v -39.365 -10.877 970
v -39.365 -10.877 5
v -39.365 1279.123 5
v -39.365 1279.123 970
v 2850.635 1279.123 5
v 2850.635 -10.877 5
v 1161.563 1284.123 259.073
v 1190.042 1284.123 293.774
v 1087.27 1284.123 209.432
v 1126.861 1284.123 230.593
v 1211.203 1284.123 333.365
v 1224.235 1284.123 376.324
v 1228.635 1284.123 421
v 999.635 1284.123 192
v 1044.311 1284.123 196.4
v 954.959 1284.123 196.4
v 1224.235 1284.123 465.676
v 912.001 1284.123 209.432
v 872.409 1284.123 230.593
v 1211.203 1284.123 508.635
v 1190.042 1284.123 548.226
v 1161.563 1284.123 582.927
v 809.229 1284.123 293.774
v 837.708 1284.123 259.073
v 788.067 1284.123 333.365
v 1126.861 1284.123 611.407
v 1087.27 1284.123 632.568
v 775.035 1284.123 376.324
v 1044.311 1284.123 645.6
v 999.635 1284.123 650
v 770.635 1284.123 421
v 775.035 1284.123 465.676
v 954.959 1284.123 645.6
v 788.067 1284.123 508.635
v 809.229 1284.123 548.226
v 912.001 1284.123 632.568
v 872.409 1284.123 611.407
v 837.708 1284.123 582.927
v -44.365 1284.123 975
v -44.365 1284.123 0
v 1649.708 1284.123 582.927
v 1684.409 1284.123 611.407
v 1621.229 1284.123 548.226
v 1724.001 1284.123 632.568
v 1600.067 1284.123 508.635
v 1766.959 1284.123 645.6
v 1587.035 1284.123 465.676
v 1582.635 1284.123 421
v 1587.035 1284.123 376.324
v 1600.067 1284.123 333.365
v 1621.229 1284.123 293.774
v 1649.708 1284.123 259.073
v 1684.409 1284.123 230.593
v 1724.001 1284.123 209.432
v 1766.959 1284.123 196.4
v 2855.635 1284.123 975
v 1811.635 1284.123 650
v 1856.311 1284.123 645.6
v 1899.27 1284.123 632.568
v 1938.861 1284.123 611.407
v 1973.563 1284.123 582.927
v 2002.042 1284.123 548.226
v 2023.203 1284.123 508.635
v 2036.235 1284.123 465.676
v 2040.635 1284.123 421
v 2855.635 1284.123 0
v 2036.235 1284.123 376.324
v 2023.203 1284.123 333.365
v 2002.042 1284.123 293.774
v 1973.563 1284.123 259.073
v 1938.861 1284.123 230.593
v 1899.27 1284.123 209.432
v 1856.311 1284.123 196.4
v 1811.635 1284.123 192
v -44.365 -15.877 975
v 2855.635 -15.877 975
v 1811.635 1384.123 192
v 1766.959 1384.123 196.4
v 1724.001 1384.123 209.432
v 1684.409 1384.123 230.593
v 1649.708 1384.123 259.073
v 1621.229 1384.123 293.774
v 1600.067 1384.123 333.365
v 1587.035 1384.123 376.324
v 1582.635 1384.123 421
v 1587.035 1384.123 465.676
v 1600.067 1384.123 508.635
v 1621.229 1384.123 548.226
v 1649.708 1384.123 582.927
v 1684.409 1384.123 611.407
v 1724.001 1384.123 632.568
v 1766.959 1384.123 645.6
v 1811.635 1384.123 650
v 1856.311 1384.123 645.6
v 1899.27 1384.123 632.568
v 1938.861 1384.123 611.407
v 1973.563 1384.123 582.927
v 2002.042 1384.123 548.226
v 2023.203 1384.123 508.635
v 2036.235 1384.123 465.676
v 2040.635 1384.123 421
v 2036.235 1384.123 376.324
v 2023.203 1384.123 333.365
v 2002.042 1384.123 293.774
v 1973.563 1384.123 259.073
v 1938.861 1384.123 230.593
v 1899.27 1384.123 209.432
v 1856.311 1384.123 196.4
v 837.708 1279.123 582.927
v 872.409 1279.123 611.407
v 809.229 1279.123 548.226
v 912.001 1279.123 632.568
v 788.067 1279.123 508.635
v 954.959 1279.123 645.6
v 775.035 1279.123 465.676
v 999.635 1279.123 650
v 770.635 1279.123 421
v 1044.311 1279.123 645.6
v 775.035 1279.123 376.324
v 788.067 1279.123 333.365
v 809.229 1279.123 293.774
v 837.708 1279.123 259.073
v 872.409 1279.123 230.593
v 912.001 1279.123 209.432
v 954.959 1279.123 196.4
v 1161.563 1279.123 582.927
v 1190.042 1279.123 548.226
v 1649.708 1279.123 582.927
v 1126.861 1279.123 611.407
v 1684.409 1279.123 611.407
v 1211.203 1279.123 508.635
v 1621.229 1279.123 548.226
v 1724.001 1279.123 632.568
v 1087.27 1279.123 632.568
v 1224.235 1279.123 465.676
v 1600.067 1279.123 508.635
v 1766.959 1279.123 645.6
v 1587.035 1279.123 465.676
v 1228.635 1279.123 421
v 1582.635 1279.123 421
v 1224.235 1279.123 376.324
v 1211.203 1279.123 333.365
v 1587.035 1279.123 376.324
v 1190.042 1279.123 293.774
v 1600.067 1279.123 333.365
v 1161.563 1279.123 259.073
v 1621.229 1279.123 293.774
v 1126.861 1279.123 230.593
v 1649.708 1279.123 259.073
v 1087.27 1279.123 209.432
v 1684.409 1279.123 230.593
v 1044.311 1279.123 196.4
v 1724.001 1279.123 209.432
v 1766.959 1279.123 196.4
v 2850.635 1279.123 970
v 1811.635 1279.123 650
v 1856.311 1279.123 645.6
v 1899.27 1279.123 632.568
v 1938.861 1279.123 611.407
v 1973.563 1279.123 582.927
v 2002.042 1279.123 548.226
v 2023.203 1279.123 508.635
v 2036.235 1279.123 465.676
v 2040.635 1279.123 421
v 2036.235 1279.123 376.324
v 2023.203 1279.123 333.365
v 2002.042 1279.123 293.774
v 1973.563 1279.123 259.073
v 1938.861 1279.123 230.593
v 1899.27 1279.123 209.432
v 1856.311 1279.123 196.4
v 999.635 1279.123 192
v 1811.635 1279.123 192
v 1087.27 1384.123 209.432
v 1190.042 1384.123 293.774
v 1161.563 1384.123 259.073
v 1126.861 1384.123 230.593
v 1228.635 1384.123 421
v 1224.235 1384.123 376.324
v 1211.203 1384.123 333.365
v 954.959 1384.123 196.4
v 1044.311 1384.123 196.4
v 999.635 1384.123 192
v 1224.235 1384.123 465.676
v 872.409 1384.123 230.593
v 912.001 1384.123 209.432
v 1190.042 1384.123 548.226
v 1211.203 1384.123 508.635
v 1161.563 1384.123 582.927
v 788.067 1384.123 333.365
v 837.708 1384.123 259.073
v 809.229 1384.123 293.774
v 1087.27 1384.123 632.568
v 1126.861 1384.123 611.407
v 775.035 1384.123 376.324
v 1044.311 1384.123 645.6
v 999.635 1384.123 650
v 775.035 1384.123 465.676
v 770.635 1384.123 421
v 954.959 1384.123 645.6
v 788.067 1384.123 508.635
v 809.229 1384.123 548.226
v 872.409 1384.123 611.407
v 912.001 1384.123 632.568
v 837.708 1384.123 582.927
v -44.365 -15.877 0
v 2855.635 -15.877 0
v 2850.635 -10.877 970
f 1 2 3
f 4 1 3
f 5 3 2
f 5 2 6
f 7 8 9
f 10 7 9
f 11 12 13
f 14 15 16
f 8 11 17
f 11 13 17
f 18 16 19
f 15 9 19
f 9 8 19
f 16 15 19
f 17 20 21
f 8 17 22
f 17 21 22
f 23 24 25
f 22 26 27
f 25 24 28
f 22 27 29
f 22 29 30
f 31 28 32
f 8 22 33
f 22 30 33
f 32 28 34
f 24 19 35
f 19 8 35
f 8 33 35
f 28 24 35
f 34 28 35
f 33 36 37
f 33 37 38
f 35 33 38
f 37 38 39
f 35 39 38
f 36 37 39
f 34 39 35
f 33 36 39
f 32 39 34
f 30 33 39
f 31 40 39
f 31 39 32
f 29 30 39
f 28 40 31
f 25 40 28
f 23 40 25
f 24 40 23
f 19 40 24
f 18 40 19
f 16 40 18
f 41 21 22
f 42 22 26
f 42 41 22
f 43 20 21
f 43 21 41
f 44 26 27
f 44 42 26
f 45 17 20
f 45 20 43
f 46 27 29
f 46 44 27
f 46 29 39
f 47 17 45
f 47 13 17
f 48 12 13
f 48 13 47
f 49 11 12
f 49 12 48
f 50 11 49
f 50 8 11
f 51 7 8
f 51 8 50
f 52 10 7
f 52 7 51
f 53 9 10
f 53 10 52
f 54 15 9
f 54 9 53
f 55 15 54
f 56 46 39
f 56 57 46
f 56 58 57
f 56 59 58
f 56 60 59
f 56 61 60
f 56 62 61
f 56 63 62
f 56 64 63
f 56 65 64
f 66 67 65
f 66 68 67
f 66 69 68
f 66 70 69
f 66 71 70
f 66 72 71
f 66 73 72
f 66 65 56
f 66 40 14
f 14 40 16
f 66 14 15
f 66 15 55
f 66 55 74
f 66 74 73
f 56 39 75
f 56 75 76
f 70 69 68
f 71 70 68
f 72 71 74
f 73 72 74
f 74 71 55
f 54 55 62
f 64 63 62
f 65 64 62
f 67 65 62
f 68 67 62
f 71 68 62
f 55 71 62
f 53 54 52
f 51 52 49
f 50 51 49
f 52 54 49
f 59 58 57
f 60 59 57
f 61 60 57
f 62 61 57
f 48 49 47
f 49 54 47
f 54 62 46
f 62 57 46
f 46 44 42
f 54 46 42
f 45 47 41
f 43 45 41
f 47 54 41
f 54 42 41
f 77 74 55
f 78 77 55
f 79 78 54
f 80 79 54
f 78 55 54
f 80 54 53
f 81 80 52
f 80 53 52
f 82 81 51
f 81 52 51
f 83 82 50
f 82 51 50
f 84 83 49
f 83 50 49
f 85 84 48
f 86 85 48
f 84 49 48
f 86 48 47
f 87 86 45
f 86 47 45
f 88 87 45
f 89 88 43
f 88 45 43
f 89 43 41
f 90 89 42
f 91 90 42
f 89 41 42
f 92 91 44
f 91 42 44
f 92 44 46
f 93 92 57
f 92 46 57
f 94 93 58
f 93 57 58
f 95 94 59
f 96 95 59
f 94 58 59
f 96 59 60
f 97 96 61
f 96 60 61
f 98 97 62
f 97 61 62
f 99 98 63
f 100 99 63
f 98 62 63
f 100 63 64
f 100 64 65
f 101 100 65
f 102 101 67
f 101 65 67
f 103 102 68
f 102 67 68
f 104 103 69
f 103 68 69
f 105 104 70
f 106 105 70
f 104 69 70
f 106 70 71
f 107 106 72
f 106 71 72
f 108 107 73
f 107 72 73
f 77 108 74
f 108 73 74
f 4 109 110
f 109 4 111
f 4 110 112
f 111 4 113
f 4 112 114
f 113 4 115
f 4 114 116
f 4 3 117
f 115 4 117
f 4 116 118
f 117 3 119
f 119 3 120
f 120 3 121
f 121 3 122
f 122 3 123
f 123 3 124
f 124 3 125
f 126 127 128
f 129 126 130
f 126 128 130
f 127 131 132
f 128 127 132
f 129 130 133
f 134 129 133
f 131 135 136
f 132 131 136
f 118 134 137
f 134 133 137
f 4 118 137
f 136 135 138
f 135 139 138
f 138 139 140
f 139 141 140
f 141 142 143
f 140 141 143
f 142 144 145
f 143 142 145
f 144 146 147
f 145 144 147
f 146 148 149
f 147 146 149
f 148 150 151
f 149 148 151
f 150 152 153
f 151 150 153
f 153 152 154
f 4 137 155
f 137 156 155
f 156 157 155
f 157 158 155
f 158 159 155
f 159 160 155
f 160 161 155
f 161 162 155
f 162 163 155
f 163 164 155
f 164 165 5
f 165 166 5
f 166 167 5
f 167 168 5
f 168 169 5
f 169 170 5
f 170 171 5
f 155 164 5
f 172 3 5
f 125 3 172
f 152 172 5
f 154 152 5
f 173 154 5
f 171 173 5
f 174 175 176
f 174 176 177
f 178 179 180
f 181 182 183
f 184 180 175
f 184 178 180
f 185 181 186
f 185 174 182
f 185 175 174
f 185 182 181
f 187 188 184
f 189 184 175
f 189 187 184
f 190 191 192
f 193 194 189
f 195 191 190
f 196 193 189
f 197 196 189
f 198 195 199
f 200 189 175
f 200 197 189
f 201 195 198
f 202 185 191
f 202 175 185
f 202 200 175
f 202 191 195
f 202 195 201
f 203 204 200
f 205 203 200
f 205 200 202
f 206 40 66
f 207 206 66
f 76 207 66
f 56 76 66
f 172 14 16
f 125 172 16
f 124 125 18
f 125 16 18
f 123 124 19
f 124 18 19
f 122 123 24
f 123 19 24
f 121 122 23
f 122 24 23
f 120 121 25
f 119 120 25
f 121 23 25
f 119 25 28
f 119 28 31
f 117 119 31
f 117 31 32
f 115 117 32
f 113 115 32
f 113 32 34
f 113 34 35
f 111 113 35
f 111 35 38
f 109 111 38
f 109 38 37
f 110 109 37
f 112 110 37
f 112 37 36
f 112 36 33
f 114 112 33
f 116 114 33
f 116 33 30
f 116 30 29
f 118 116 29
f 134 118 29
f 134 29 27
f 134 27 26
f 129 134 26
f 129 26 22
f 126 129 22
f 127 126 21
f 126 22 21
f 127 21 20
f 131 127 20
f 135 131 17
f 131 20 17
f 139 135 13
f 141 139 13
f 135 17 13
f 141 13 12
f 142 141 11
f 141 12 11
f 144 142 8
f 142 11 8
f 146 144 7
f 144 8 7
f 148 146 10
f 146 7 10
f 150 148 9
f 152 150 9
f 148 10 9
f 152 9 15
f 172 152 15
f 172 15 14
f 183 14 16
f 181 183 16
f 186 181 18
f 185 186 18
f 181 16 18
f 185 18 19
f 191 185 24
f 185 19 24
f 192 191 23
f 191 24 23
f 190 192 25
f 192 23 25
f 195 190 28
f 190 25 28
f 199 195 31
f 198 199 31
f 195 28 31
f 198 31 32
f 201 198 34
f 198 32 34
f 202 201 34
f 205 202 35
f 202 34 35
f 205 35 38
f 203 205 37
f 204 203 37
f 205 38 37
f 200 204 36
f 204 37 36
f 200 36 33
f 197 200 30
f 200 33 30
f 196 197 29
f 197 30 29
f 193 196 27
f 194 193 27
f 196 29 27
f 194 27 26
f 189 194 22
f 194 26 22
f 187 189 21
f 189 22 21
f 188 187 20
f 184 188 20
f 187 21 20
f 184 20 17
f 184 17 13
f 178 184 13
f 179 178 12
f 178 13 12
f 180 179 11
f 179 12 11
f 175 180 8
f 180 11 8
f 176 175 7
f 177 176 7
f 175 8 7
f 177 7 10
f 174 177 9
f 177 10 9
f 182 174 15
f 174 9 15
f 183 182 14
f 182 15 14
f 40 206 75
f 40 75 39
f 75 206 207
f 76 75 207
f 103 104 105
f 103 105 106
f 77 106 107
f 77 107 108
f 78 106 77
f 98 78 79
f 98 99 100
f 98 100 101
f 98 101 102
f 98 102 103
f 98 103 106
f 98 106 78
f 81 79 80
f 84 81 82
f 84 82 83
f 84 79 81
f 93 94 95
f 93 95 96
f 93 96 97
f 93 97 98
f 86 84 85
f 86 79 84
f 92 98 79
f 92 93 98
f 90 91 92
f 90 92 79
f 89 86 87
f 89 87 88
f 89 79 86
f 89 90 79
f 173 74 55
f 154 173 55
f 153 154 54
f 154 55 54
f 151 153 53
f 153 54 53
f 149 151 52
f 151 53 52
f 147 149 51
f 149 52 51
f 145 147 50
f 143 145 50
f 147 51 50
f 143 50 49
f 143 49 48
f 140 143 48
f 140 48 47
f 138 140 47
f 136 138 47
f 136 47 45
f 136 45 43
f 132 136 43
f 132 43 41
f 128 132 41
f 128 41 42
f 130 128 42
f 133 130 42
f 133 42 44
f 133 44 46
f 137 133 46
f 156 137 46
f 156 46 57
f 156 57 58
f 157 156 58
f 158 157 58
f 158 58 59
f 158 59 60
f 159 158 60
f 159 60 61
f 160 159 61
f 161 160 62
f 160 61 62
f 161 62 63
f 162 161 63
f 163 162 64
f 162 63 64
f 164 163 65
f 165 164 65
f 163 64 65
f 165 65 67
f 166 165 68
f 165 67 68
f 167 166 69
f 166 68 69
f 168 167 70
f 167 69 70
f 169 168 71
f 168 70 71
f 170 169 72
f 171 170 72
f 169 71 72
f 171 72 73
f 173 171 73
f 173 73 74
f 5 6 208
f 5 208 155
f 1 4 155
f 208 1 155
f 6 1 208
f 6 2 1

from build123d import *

# Parameters (mm, degrees)
F0_W     = 2900
F0_H     = 1300
F1_DEPTH = 975
F2_T     = -5
F4_DEPTH = 100
F5_DEPTH = 326


with BuildPart() as f1:
    # F0 (on Top) → F1 (new body)
    with BuildSketch(Plane.XY):
        with Locations((1405.6350782514, 634.1229822487)):
            Rectangle(F0_W, F0_H)
    extrude(amount=F1_DEPTH)

    # F2 (hollow: no face is removed)
    offset(amount=F2_T, mode=Mode.SUBTRACT)

    # F3 (on face) → F5 (cut)
    with BuildSketch(Plane(origin=(0, 1284.1229822487, 0), x_dir=(-1, 0, 0), z_dir=(0, 1, 0))):
        with BuildLine():
            ThreePointArc((-1811.6350782514, 650), (-1973.5625311431, 582.9274528917), (-2040.6350782514, 421))
            Line((-2040.6350782514, 421), (-1811.6350782514, 421))
            Line((-1811.6350782514, 421), (-1811.6350782514, 650))
        make_face()
        with BuildLine():
            ThreePointArc((-999.6350782514, 650), (-1161.5625311431, 582.9274528917), (-1228.6350782514, 421))
            Line((-1228.6350782514, 421), (-999.6350782514, 421))
            Line((-999.6350782514, 421), (-999.6350782514, 650))
        make_face()
        with BuildLine():
            Line((-999.6350782514, 421), (-1228.6350782514, 421))
            ThreePointArc((-1228.6350782514, 421), (-1161.5625311431, 259.0725471083), (-999.6350782514, 192))
            Line((-999.6350782514, 192), (-999.6350782514, 421))
        make_face()
        with BuildLine():
            Line((-1811.6350782514, 421), (-2040.6350782514, 421))
            ThreePointArc((-2040.6350782514, 421), (-1973.5625311431, 259.0725471083), (-1811.6350782514, 192))
            Line((-1811.6350782514, 192), (-1811.6350782514, 421))
        make_face()
        with BuildLine():
            Line((-1811.6350782514, 650), (-1811.6350782514, 421))
            Line((-1811.6350782514, 421), (-1582.6350782514, 421))
            ThreePointArc((-1582.6350782514, 421), (-1649.7076253596, 582.9274528917), (-1811.6350782514, 650))
        make_face()
        with BuildLine():
            Line((-1582.6350782514, 421), (-1811.6350782514, 421))
            Line((-1811.6350782514, 421), (-1811.6350782514, 192))
            ThreePointArc((-1811.6350782514, 192), (-1649.7076253596, 259.0725471083), (-1582.6350782514, 421))
        make_face()
        with BuildLine():
            Line((-999.6350782514, 650), (-999.6350782514, 421))
            Line((-999.6350782514, 421), (-770.6350782514, 421))
            ThreePointArc((-770.6350782514, 421), (-837.7076253596, 582.9274528917), (-999.6350782514, 650))
        make_face()
        with BuildLine():
            Line((-770.6350782514, 421), (-999.6350782514, 421))
            Line((-999.6350782514, 421), (-999.6350782514, 192))
            ThreePointArc((-999.6350782514, 192), (-837.7076253596, 259.0725471083), (-770.6350782514, 421))
        make_face()
    extrude(amount=-F5_DEPTH, mode=Mode.SUBTRACT)


with BuildPart() as f4:
    # F3 (on face) → F4 (new body)
    with BuildSketch(Plane(origin=(0, 1284.1229822487, 0), x_dir=(-1, 0, 0), z_dir=(0, 1, 0))):
        with BuildLine():
            Line((-1811.6350782514, 192), (-1811.6350782514, 421))
            Line((-1811.6350782514, 421), (-2040.6350782514, 421))
            ThreePointArc((-2040.6350782514, 421), (-1973.5625311431, 259.0725471083), (-1811.6350782514, 192))
        make_face()
        with BuildLine():
            Line((-2040.6350782514, 421), (-1811.6350782514, 421))
            Line((-1811.6350782514, 421), (-1811.6350782514, 650))
            ThreePointArc((-1811.6350782514, 650), (-1973.5625311431, 582.9274528917), (-2040.6350782514, 421))
        make_face()
        with BuildLine():
            Line((-1811.6350782514, 421), (-1582.6350782514, 421))
            ThreePointArc((-1582.6350782514, 421), (-1649.7076253596, 582.9274528917), (-1811.6350782514, 650))
            Line((-1811.6350782514, 650), (-1811.6350782514, 421))
        make_face()
        with BuildLine():
            ThreePointArc((-1811.6350782514, 192), (-1649.7076253596, 259.0725471083), (-1582.6350782514, 421))
            Line((-1582.6350782514, 421), (-1811.6350782514, 421))
            Line((-1811.6350782514, 421), (-1811.6350782514, 192))
        make_face()
    extrude(amount=F4_DEPTH)


with BuildPart() as f4b:
    # F3 (on face) → F4, piece 2 (new body)
    with BuildSketch(Plane(origin=(0, 1284.1229822487, 0), x_dir=(-1, 0, 0), z_dir=(0, 1, 0))):
        with BuildLine():
            Line((-999.6350782514, 192), (-999.6350782514, 421))
            Line((-999.6350782514, 421), (-1228.6350782514, 421))
            ThreePointArc((-1228.6350782514, 421), (-1161.5625311431, 259.0725471083), (-999.6350782514, 192))
        make_face()
        with BuildLine():
            Line((-1228.6350782514, 421), (-999.6350782514, 421))
            Line((-999.6350782514, 421), (-999.6350782514, 650))
            ThreePointArc((-999.6350782514, 650), (-1161.5625311431, 582.9274528917), (-1228.6350782514, 421))
        make_face()
        with BuildLine():
            Line((-999.6350782514, 421), (-770.6350782514, 421))
            ThreePointArc((-770.6350782514, 421), (-837.7076253596, 582.9274528917), (-999.6350782514, 650))
            Line((-999.6350782514, 650), (-999.6350782514, 421))
        make_face()
        with BuildLine():
            ThreePointArc((-999.6350782514, 192), (-837.7076253596, 259.0725471083), (-770.6350782514, 421))
            Line((-770.6350782514, 421), (-999.6350782514, 421))
            Line((-999.6350782514, 421), (-999.6350782514, 192))
        make_face()
    extrude(amount=F4_DEPTH)


solid = Compound([f1.part, f4.part, f4b.part])
